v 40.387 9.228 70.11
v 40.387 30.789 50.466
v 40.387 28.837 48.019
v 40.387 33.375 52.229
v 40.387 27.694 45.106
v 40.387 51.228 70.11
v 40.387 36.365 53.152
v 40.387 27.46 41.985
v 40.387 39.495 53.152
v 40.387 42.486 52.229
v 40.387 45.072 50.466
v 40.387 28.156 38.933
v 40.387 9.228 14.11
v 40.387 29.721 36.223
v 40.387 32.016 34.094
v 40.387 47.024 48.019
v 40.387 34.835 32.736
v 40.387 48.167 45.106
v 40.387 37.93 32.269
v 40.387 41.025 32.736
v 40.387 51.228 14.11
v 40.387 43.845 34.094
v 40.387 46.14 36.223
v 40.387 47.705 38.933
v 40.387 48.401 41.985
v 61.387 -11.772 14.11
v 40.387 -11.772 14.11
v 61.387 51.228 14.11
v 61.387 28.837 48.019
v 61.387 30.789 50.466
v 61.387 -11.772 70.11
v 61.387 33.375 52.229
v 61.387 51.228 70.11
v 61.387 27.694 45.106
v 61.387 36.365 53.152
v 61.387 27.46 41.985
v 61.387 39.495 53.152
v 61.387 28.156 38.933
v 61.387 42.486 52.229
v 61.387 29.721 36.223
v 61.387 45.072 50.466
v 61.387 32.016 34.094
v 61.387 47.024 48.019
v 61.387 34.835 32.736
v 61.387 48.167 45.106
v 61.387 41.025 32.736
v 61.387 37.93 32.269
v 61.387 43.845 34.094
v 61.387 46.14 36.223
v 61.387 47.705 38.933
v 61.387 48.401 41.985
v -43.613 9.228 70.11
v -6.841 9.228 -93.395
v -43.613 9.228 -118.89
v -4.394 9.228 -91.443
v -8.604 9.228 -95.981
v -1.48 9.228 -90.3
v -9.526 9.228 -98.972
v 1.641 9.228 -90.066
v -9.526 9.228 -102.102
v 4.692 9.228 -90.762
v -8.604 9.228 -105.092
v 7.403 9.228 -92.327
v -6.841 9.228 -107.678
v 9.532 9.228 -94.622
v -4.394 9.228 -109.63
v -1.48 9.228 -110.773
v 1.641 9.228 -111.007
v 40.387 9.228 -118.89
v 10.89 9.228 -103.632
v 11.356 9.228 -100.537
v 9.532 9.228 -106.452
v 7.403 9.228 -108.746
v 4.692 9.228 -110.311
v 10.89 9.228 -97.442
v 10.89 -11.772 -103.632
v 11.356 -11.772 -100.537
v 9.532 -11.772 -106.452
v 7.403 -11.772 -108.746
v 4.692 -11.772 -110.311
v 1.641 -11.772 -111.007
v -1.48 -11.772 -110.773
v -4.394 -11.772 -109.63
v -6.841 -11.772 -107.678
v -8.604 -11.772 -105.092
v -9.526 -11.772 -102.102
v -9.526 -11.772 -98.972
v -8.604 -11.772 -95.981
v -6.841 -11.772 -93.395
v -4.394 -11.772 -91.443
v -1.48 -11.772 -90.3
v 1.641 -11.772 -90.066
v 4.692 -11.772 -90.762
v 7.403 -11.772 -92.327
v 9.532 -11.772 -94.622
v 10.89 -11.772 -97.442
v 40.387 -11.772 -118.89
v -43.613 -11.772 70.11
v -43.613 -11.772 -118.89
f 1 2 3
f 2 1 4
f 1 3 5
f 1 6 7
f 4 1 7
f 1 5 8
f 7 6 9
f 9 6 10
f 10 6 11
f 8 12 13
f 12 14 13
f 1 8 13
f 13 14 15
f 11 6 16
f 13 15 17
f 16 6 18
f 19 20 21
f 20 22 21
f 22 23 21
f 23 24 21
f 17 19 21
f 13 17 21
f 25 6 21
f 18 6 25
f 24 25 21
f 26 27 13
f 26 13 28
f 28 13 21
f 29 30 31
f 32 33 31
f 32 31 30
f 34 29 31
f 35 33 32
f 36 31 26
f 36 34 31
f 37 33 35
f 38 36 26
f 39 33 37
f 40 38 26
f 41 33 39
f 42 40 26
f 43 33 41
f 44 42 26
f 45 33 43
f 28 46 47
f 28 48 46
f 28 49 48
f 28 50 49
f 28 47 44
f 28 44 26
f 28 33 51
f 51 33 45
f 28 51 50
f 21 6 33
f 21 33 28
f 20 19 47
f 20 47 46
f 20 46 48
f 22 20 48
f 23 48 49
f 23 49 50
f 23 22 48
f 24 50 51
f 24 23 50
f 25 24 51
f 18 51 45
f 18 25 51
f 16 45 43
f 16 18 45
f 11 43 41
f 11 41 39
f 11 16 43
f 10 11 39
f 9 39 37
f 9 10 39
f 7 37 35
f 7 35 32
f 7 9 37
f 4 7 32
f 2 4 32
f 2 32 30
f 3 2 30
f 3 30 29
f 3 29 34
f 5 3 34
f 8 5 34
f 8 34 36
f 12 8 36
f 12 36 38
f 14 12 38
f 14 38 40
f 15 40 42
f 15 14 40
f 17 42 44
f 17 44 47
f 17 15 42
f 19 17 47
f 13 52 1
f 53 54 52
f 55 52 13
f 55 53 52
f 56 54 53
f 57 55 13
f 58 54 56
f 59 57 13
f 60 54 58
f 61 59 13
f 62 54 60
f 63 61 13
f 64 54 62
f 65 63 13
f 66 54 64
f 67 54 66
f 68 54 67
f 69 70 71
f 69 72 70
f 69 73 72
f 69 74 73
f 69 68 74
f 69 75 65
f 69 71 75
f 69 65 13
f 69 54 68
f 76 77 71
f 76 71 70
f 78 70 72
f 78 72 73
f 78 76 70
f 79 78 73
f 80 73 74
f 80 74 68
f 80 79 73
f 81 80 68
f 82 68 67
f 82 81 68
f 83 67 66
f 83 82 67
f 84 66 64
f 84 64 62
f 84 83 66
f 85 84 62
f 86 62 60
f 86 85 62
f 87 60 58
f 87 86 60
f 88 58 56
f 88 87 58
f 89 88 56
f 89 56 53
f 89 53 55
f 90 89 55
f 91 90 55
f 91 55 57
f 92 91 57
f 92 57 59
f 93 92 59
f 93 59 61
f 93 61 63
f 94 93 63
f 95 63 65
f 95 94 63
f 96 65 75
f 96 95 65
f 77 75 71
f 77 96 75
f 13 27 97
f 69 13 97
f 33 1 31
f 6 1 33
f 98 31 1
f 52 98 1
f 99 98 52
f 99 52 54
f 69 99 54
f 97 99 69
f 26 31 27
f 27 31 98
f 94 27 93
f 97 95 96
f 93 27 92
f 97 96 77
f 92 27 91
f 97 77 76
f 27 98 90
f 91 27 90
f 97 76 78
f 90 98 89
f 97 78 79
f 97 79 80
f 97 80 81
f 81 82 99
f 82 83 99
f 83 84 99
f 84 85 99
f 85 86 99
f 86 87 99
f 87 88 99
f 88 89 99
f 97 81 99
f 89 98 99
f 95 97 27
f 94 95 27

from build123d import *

# Parameters (mm, degrees)
CROQUIS1_W              = 12
CROQUIS1_H              = 27
CROQUIS1_R              = 1.5
SALIENTE_EXTRUIR2_DEPTH = 3
CROQUIS6_W              = 8
CROQUIS6_H              = 9
CROQUIS6_R              = 1.5
SALIENTE_EXTRUIR4_DEPTH = 3
ESCALA1_SCALE           = 7


with BuildPart() as part:
    # Croquis1 → Saliente-Extruir2 (new body)
    with BuildSketch(Plane(origin=(0, 0, 0), x_dir=(1, 0, 0), z_dir=(0, 1, 0))):
        with Locations((6, 13.5)):
            Rectangle(CROQUIS1_W, CROQUIS1_H)
        with Locations((6.352695101, 24.378103836)):
            Circle(CROQUIS1_R, mode=Mode.SUBTRACT)
    extrude(amount=SALIENTE_EXTRUIR2_DEPTH)

    # Croquis6 → Saliente-Extruir4 (add)
    with BuildSketch(Plane(origin=(12, 0, 0), x_dir=(0, 0, -1), z_dir=(1, 0, 0))):
        with Locations((4, 4.5)):
            Rectangle(CROQUIS6_W, CROQUIS6_H)
        with Locations((3.905842021, 7.100326765)):
            Circle(CROQUIS6_R, mode=Mode.SUBTRACT)
    extrude(amount=SALIENTE_EXTRUIR4_DEPTH)


with BuildPart() as part_1:
    # Escala1: scaled about (7.268760736, 1.961981653, -11.685014046)
    add(part.part.scale(ESCALA1_SCALE).moved(Location((-43.612564416, -11.771889918, 70.110084276))))


solid = part_1.part
